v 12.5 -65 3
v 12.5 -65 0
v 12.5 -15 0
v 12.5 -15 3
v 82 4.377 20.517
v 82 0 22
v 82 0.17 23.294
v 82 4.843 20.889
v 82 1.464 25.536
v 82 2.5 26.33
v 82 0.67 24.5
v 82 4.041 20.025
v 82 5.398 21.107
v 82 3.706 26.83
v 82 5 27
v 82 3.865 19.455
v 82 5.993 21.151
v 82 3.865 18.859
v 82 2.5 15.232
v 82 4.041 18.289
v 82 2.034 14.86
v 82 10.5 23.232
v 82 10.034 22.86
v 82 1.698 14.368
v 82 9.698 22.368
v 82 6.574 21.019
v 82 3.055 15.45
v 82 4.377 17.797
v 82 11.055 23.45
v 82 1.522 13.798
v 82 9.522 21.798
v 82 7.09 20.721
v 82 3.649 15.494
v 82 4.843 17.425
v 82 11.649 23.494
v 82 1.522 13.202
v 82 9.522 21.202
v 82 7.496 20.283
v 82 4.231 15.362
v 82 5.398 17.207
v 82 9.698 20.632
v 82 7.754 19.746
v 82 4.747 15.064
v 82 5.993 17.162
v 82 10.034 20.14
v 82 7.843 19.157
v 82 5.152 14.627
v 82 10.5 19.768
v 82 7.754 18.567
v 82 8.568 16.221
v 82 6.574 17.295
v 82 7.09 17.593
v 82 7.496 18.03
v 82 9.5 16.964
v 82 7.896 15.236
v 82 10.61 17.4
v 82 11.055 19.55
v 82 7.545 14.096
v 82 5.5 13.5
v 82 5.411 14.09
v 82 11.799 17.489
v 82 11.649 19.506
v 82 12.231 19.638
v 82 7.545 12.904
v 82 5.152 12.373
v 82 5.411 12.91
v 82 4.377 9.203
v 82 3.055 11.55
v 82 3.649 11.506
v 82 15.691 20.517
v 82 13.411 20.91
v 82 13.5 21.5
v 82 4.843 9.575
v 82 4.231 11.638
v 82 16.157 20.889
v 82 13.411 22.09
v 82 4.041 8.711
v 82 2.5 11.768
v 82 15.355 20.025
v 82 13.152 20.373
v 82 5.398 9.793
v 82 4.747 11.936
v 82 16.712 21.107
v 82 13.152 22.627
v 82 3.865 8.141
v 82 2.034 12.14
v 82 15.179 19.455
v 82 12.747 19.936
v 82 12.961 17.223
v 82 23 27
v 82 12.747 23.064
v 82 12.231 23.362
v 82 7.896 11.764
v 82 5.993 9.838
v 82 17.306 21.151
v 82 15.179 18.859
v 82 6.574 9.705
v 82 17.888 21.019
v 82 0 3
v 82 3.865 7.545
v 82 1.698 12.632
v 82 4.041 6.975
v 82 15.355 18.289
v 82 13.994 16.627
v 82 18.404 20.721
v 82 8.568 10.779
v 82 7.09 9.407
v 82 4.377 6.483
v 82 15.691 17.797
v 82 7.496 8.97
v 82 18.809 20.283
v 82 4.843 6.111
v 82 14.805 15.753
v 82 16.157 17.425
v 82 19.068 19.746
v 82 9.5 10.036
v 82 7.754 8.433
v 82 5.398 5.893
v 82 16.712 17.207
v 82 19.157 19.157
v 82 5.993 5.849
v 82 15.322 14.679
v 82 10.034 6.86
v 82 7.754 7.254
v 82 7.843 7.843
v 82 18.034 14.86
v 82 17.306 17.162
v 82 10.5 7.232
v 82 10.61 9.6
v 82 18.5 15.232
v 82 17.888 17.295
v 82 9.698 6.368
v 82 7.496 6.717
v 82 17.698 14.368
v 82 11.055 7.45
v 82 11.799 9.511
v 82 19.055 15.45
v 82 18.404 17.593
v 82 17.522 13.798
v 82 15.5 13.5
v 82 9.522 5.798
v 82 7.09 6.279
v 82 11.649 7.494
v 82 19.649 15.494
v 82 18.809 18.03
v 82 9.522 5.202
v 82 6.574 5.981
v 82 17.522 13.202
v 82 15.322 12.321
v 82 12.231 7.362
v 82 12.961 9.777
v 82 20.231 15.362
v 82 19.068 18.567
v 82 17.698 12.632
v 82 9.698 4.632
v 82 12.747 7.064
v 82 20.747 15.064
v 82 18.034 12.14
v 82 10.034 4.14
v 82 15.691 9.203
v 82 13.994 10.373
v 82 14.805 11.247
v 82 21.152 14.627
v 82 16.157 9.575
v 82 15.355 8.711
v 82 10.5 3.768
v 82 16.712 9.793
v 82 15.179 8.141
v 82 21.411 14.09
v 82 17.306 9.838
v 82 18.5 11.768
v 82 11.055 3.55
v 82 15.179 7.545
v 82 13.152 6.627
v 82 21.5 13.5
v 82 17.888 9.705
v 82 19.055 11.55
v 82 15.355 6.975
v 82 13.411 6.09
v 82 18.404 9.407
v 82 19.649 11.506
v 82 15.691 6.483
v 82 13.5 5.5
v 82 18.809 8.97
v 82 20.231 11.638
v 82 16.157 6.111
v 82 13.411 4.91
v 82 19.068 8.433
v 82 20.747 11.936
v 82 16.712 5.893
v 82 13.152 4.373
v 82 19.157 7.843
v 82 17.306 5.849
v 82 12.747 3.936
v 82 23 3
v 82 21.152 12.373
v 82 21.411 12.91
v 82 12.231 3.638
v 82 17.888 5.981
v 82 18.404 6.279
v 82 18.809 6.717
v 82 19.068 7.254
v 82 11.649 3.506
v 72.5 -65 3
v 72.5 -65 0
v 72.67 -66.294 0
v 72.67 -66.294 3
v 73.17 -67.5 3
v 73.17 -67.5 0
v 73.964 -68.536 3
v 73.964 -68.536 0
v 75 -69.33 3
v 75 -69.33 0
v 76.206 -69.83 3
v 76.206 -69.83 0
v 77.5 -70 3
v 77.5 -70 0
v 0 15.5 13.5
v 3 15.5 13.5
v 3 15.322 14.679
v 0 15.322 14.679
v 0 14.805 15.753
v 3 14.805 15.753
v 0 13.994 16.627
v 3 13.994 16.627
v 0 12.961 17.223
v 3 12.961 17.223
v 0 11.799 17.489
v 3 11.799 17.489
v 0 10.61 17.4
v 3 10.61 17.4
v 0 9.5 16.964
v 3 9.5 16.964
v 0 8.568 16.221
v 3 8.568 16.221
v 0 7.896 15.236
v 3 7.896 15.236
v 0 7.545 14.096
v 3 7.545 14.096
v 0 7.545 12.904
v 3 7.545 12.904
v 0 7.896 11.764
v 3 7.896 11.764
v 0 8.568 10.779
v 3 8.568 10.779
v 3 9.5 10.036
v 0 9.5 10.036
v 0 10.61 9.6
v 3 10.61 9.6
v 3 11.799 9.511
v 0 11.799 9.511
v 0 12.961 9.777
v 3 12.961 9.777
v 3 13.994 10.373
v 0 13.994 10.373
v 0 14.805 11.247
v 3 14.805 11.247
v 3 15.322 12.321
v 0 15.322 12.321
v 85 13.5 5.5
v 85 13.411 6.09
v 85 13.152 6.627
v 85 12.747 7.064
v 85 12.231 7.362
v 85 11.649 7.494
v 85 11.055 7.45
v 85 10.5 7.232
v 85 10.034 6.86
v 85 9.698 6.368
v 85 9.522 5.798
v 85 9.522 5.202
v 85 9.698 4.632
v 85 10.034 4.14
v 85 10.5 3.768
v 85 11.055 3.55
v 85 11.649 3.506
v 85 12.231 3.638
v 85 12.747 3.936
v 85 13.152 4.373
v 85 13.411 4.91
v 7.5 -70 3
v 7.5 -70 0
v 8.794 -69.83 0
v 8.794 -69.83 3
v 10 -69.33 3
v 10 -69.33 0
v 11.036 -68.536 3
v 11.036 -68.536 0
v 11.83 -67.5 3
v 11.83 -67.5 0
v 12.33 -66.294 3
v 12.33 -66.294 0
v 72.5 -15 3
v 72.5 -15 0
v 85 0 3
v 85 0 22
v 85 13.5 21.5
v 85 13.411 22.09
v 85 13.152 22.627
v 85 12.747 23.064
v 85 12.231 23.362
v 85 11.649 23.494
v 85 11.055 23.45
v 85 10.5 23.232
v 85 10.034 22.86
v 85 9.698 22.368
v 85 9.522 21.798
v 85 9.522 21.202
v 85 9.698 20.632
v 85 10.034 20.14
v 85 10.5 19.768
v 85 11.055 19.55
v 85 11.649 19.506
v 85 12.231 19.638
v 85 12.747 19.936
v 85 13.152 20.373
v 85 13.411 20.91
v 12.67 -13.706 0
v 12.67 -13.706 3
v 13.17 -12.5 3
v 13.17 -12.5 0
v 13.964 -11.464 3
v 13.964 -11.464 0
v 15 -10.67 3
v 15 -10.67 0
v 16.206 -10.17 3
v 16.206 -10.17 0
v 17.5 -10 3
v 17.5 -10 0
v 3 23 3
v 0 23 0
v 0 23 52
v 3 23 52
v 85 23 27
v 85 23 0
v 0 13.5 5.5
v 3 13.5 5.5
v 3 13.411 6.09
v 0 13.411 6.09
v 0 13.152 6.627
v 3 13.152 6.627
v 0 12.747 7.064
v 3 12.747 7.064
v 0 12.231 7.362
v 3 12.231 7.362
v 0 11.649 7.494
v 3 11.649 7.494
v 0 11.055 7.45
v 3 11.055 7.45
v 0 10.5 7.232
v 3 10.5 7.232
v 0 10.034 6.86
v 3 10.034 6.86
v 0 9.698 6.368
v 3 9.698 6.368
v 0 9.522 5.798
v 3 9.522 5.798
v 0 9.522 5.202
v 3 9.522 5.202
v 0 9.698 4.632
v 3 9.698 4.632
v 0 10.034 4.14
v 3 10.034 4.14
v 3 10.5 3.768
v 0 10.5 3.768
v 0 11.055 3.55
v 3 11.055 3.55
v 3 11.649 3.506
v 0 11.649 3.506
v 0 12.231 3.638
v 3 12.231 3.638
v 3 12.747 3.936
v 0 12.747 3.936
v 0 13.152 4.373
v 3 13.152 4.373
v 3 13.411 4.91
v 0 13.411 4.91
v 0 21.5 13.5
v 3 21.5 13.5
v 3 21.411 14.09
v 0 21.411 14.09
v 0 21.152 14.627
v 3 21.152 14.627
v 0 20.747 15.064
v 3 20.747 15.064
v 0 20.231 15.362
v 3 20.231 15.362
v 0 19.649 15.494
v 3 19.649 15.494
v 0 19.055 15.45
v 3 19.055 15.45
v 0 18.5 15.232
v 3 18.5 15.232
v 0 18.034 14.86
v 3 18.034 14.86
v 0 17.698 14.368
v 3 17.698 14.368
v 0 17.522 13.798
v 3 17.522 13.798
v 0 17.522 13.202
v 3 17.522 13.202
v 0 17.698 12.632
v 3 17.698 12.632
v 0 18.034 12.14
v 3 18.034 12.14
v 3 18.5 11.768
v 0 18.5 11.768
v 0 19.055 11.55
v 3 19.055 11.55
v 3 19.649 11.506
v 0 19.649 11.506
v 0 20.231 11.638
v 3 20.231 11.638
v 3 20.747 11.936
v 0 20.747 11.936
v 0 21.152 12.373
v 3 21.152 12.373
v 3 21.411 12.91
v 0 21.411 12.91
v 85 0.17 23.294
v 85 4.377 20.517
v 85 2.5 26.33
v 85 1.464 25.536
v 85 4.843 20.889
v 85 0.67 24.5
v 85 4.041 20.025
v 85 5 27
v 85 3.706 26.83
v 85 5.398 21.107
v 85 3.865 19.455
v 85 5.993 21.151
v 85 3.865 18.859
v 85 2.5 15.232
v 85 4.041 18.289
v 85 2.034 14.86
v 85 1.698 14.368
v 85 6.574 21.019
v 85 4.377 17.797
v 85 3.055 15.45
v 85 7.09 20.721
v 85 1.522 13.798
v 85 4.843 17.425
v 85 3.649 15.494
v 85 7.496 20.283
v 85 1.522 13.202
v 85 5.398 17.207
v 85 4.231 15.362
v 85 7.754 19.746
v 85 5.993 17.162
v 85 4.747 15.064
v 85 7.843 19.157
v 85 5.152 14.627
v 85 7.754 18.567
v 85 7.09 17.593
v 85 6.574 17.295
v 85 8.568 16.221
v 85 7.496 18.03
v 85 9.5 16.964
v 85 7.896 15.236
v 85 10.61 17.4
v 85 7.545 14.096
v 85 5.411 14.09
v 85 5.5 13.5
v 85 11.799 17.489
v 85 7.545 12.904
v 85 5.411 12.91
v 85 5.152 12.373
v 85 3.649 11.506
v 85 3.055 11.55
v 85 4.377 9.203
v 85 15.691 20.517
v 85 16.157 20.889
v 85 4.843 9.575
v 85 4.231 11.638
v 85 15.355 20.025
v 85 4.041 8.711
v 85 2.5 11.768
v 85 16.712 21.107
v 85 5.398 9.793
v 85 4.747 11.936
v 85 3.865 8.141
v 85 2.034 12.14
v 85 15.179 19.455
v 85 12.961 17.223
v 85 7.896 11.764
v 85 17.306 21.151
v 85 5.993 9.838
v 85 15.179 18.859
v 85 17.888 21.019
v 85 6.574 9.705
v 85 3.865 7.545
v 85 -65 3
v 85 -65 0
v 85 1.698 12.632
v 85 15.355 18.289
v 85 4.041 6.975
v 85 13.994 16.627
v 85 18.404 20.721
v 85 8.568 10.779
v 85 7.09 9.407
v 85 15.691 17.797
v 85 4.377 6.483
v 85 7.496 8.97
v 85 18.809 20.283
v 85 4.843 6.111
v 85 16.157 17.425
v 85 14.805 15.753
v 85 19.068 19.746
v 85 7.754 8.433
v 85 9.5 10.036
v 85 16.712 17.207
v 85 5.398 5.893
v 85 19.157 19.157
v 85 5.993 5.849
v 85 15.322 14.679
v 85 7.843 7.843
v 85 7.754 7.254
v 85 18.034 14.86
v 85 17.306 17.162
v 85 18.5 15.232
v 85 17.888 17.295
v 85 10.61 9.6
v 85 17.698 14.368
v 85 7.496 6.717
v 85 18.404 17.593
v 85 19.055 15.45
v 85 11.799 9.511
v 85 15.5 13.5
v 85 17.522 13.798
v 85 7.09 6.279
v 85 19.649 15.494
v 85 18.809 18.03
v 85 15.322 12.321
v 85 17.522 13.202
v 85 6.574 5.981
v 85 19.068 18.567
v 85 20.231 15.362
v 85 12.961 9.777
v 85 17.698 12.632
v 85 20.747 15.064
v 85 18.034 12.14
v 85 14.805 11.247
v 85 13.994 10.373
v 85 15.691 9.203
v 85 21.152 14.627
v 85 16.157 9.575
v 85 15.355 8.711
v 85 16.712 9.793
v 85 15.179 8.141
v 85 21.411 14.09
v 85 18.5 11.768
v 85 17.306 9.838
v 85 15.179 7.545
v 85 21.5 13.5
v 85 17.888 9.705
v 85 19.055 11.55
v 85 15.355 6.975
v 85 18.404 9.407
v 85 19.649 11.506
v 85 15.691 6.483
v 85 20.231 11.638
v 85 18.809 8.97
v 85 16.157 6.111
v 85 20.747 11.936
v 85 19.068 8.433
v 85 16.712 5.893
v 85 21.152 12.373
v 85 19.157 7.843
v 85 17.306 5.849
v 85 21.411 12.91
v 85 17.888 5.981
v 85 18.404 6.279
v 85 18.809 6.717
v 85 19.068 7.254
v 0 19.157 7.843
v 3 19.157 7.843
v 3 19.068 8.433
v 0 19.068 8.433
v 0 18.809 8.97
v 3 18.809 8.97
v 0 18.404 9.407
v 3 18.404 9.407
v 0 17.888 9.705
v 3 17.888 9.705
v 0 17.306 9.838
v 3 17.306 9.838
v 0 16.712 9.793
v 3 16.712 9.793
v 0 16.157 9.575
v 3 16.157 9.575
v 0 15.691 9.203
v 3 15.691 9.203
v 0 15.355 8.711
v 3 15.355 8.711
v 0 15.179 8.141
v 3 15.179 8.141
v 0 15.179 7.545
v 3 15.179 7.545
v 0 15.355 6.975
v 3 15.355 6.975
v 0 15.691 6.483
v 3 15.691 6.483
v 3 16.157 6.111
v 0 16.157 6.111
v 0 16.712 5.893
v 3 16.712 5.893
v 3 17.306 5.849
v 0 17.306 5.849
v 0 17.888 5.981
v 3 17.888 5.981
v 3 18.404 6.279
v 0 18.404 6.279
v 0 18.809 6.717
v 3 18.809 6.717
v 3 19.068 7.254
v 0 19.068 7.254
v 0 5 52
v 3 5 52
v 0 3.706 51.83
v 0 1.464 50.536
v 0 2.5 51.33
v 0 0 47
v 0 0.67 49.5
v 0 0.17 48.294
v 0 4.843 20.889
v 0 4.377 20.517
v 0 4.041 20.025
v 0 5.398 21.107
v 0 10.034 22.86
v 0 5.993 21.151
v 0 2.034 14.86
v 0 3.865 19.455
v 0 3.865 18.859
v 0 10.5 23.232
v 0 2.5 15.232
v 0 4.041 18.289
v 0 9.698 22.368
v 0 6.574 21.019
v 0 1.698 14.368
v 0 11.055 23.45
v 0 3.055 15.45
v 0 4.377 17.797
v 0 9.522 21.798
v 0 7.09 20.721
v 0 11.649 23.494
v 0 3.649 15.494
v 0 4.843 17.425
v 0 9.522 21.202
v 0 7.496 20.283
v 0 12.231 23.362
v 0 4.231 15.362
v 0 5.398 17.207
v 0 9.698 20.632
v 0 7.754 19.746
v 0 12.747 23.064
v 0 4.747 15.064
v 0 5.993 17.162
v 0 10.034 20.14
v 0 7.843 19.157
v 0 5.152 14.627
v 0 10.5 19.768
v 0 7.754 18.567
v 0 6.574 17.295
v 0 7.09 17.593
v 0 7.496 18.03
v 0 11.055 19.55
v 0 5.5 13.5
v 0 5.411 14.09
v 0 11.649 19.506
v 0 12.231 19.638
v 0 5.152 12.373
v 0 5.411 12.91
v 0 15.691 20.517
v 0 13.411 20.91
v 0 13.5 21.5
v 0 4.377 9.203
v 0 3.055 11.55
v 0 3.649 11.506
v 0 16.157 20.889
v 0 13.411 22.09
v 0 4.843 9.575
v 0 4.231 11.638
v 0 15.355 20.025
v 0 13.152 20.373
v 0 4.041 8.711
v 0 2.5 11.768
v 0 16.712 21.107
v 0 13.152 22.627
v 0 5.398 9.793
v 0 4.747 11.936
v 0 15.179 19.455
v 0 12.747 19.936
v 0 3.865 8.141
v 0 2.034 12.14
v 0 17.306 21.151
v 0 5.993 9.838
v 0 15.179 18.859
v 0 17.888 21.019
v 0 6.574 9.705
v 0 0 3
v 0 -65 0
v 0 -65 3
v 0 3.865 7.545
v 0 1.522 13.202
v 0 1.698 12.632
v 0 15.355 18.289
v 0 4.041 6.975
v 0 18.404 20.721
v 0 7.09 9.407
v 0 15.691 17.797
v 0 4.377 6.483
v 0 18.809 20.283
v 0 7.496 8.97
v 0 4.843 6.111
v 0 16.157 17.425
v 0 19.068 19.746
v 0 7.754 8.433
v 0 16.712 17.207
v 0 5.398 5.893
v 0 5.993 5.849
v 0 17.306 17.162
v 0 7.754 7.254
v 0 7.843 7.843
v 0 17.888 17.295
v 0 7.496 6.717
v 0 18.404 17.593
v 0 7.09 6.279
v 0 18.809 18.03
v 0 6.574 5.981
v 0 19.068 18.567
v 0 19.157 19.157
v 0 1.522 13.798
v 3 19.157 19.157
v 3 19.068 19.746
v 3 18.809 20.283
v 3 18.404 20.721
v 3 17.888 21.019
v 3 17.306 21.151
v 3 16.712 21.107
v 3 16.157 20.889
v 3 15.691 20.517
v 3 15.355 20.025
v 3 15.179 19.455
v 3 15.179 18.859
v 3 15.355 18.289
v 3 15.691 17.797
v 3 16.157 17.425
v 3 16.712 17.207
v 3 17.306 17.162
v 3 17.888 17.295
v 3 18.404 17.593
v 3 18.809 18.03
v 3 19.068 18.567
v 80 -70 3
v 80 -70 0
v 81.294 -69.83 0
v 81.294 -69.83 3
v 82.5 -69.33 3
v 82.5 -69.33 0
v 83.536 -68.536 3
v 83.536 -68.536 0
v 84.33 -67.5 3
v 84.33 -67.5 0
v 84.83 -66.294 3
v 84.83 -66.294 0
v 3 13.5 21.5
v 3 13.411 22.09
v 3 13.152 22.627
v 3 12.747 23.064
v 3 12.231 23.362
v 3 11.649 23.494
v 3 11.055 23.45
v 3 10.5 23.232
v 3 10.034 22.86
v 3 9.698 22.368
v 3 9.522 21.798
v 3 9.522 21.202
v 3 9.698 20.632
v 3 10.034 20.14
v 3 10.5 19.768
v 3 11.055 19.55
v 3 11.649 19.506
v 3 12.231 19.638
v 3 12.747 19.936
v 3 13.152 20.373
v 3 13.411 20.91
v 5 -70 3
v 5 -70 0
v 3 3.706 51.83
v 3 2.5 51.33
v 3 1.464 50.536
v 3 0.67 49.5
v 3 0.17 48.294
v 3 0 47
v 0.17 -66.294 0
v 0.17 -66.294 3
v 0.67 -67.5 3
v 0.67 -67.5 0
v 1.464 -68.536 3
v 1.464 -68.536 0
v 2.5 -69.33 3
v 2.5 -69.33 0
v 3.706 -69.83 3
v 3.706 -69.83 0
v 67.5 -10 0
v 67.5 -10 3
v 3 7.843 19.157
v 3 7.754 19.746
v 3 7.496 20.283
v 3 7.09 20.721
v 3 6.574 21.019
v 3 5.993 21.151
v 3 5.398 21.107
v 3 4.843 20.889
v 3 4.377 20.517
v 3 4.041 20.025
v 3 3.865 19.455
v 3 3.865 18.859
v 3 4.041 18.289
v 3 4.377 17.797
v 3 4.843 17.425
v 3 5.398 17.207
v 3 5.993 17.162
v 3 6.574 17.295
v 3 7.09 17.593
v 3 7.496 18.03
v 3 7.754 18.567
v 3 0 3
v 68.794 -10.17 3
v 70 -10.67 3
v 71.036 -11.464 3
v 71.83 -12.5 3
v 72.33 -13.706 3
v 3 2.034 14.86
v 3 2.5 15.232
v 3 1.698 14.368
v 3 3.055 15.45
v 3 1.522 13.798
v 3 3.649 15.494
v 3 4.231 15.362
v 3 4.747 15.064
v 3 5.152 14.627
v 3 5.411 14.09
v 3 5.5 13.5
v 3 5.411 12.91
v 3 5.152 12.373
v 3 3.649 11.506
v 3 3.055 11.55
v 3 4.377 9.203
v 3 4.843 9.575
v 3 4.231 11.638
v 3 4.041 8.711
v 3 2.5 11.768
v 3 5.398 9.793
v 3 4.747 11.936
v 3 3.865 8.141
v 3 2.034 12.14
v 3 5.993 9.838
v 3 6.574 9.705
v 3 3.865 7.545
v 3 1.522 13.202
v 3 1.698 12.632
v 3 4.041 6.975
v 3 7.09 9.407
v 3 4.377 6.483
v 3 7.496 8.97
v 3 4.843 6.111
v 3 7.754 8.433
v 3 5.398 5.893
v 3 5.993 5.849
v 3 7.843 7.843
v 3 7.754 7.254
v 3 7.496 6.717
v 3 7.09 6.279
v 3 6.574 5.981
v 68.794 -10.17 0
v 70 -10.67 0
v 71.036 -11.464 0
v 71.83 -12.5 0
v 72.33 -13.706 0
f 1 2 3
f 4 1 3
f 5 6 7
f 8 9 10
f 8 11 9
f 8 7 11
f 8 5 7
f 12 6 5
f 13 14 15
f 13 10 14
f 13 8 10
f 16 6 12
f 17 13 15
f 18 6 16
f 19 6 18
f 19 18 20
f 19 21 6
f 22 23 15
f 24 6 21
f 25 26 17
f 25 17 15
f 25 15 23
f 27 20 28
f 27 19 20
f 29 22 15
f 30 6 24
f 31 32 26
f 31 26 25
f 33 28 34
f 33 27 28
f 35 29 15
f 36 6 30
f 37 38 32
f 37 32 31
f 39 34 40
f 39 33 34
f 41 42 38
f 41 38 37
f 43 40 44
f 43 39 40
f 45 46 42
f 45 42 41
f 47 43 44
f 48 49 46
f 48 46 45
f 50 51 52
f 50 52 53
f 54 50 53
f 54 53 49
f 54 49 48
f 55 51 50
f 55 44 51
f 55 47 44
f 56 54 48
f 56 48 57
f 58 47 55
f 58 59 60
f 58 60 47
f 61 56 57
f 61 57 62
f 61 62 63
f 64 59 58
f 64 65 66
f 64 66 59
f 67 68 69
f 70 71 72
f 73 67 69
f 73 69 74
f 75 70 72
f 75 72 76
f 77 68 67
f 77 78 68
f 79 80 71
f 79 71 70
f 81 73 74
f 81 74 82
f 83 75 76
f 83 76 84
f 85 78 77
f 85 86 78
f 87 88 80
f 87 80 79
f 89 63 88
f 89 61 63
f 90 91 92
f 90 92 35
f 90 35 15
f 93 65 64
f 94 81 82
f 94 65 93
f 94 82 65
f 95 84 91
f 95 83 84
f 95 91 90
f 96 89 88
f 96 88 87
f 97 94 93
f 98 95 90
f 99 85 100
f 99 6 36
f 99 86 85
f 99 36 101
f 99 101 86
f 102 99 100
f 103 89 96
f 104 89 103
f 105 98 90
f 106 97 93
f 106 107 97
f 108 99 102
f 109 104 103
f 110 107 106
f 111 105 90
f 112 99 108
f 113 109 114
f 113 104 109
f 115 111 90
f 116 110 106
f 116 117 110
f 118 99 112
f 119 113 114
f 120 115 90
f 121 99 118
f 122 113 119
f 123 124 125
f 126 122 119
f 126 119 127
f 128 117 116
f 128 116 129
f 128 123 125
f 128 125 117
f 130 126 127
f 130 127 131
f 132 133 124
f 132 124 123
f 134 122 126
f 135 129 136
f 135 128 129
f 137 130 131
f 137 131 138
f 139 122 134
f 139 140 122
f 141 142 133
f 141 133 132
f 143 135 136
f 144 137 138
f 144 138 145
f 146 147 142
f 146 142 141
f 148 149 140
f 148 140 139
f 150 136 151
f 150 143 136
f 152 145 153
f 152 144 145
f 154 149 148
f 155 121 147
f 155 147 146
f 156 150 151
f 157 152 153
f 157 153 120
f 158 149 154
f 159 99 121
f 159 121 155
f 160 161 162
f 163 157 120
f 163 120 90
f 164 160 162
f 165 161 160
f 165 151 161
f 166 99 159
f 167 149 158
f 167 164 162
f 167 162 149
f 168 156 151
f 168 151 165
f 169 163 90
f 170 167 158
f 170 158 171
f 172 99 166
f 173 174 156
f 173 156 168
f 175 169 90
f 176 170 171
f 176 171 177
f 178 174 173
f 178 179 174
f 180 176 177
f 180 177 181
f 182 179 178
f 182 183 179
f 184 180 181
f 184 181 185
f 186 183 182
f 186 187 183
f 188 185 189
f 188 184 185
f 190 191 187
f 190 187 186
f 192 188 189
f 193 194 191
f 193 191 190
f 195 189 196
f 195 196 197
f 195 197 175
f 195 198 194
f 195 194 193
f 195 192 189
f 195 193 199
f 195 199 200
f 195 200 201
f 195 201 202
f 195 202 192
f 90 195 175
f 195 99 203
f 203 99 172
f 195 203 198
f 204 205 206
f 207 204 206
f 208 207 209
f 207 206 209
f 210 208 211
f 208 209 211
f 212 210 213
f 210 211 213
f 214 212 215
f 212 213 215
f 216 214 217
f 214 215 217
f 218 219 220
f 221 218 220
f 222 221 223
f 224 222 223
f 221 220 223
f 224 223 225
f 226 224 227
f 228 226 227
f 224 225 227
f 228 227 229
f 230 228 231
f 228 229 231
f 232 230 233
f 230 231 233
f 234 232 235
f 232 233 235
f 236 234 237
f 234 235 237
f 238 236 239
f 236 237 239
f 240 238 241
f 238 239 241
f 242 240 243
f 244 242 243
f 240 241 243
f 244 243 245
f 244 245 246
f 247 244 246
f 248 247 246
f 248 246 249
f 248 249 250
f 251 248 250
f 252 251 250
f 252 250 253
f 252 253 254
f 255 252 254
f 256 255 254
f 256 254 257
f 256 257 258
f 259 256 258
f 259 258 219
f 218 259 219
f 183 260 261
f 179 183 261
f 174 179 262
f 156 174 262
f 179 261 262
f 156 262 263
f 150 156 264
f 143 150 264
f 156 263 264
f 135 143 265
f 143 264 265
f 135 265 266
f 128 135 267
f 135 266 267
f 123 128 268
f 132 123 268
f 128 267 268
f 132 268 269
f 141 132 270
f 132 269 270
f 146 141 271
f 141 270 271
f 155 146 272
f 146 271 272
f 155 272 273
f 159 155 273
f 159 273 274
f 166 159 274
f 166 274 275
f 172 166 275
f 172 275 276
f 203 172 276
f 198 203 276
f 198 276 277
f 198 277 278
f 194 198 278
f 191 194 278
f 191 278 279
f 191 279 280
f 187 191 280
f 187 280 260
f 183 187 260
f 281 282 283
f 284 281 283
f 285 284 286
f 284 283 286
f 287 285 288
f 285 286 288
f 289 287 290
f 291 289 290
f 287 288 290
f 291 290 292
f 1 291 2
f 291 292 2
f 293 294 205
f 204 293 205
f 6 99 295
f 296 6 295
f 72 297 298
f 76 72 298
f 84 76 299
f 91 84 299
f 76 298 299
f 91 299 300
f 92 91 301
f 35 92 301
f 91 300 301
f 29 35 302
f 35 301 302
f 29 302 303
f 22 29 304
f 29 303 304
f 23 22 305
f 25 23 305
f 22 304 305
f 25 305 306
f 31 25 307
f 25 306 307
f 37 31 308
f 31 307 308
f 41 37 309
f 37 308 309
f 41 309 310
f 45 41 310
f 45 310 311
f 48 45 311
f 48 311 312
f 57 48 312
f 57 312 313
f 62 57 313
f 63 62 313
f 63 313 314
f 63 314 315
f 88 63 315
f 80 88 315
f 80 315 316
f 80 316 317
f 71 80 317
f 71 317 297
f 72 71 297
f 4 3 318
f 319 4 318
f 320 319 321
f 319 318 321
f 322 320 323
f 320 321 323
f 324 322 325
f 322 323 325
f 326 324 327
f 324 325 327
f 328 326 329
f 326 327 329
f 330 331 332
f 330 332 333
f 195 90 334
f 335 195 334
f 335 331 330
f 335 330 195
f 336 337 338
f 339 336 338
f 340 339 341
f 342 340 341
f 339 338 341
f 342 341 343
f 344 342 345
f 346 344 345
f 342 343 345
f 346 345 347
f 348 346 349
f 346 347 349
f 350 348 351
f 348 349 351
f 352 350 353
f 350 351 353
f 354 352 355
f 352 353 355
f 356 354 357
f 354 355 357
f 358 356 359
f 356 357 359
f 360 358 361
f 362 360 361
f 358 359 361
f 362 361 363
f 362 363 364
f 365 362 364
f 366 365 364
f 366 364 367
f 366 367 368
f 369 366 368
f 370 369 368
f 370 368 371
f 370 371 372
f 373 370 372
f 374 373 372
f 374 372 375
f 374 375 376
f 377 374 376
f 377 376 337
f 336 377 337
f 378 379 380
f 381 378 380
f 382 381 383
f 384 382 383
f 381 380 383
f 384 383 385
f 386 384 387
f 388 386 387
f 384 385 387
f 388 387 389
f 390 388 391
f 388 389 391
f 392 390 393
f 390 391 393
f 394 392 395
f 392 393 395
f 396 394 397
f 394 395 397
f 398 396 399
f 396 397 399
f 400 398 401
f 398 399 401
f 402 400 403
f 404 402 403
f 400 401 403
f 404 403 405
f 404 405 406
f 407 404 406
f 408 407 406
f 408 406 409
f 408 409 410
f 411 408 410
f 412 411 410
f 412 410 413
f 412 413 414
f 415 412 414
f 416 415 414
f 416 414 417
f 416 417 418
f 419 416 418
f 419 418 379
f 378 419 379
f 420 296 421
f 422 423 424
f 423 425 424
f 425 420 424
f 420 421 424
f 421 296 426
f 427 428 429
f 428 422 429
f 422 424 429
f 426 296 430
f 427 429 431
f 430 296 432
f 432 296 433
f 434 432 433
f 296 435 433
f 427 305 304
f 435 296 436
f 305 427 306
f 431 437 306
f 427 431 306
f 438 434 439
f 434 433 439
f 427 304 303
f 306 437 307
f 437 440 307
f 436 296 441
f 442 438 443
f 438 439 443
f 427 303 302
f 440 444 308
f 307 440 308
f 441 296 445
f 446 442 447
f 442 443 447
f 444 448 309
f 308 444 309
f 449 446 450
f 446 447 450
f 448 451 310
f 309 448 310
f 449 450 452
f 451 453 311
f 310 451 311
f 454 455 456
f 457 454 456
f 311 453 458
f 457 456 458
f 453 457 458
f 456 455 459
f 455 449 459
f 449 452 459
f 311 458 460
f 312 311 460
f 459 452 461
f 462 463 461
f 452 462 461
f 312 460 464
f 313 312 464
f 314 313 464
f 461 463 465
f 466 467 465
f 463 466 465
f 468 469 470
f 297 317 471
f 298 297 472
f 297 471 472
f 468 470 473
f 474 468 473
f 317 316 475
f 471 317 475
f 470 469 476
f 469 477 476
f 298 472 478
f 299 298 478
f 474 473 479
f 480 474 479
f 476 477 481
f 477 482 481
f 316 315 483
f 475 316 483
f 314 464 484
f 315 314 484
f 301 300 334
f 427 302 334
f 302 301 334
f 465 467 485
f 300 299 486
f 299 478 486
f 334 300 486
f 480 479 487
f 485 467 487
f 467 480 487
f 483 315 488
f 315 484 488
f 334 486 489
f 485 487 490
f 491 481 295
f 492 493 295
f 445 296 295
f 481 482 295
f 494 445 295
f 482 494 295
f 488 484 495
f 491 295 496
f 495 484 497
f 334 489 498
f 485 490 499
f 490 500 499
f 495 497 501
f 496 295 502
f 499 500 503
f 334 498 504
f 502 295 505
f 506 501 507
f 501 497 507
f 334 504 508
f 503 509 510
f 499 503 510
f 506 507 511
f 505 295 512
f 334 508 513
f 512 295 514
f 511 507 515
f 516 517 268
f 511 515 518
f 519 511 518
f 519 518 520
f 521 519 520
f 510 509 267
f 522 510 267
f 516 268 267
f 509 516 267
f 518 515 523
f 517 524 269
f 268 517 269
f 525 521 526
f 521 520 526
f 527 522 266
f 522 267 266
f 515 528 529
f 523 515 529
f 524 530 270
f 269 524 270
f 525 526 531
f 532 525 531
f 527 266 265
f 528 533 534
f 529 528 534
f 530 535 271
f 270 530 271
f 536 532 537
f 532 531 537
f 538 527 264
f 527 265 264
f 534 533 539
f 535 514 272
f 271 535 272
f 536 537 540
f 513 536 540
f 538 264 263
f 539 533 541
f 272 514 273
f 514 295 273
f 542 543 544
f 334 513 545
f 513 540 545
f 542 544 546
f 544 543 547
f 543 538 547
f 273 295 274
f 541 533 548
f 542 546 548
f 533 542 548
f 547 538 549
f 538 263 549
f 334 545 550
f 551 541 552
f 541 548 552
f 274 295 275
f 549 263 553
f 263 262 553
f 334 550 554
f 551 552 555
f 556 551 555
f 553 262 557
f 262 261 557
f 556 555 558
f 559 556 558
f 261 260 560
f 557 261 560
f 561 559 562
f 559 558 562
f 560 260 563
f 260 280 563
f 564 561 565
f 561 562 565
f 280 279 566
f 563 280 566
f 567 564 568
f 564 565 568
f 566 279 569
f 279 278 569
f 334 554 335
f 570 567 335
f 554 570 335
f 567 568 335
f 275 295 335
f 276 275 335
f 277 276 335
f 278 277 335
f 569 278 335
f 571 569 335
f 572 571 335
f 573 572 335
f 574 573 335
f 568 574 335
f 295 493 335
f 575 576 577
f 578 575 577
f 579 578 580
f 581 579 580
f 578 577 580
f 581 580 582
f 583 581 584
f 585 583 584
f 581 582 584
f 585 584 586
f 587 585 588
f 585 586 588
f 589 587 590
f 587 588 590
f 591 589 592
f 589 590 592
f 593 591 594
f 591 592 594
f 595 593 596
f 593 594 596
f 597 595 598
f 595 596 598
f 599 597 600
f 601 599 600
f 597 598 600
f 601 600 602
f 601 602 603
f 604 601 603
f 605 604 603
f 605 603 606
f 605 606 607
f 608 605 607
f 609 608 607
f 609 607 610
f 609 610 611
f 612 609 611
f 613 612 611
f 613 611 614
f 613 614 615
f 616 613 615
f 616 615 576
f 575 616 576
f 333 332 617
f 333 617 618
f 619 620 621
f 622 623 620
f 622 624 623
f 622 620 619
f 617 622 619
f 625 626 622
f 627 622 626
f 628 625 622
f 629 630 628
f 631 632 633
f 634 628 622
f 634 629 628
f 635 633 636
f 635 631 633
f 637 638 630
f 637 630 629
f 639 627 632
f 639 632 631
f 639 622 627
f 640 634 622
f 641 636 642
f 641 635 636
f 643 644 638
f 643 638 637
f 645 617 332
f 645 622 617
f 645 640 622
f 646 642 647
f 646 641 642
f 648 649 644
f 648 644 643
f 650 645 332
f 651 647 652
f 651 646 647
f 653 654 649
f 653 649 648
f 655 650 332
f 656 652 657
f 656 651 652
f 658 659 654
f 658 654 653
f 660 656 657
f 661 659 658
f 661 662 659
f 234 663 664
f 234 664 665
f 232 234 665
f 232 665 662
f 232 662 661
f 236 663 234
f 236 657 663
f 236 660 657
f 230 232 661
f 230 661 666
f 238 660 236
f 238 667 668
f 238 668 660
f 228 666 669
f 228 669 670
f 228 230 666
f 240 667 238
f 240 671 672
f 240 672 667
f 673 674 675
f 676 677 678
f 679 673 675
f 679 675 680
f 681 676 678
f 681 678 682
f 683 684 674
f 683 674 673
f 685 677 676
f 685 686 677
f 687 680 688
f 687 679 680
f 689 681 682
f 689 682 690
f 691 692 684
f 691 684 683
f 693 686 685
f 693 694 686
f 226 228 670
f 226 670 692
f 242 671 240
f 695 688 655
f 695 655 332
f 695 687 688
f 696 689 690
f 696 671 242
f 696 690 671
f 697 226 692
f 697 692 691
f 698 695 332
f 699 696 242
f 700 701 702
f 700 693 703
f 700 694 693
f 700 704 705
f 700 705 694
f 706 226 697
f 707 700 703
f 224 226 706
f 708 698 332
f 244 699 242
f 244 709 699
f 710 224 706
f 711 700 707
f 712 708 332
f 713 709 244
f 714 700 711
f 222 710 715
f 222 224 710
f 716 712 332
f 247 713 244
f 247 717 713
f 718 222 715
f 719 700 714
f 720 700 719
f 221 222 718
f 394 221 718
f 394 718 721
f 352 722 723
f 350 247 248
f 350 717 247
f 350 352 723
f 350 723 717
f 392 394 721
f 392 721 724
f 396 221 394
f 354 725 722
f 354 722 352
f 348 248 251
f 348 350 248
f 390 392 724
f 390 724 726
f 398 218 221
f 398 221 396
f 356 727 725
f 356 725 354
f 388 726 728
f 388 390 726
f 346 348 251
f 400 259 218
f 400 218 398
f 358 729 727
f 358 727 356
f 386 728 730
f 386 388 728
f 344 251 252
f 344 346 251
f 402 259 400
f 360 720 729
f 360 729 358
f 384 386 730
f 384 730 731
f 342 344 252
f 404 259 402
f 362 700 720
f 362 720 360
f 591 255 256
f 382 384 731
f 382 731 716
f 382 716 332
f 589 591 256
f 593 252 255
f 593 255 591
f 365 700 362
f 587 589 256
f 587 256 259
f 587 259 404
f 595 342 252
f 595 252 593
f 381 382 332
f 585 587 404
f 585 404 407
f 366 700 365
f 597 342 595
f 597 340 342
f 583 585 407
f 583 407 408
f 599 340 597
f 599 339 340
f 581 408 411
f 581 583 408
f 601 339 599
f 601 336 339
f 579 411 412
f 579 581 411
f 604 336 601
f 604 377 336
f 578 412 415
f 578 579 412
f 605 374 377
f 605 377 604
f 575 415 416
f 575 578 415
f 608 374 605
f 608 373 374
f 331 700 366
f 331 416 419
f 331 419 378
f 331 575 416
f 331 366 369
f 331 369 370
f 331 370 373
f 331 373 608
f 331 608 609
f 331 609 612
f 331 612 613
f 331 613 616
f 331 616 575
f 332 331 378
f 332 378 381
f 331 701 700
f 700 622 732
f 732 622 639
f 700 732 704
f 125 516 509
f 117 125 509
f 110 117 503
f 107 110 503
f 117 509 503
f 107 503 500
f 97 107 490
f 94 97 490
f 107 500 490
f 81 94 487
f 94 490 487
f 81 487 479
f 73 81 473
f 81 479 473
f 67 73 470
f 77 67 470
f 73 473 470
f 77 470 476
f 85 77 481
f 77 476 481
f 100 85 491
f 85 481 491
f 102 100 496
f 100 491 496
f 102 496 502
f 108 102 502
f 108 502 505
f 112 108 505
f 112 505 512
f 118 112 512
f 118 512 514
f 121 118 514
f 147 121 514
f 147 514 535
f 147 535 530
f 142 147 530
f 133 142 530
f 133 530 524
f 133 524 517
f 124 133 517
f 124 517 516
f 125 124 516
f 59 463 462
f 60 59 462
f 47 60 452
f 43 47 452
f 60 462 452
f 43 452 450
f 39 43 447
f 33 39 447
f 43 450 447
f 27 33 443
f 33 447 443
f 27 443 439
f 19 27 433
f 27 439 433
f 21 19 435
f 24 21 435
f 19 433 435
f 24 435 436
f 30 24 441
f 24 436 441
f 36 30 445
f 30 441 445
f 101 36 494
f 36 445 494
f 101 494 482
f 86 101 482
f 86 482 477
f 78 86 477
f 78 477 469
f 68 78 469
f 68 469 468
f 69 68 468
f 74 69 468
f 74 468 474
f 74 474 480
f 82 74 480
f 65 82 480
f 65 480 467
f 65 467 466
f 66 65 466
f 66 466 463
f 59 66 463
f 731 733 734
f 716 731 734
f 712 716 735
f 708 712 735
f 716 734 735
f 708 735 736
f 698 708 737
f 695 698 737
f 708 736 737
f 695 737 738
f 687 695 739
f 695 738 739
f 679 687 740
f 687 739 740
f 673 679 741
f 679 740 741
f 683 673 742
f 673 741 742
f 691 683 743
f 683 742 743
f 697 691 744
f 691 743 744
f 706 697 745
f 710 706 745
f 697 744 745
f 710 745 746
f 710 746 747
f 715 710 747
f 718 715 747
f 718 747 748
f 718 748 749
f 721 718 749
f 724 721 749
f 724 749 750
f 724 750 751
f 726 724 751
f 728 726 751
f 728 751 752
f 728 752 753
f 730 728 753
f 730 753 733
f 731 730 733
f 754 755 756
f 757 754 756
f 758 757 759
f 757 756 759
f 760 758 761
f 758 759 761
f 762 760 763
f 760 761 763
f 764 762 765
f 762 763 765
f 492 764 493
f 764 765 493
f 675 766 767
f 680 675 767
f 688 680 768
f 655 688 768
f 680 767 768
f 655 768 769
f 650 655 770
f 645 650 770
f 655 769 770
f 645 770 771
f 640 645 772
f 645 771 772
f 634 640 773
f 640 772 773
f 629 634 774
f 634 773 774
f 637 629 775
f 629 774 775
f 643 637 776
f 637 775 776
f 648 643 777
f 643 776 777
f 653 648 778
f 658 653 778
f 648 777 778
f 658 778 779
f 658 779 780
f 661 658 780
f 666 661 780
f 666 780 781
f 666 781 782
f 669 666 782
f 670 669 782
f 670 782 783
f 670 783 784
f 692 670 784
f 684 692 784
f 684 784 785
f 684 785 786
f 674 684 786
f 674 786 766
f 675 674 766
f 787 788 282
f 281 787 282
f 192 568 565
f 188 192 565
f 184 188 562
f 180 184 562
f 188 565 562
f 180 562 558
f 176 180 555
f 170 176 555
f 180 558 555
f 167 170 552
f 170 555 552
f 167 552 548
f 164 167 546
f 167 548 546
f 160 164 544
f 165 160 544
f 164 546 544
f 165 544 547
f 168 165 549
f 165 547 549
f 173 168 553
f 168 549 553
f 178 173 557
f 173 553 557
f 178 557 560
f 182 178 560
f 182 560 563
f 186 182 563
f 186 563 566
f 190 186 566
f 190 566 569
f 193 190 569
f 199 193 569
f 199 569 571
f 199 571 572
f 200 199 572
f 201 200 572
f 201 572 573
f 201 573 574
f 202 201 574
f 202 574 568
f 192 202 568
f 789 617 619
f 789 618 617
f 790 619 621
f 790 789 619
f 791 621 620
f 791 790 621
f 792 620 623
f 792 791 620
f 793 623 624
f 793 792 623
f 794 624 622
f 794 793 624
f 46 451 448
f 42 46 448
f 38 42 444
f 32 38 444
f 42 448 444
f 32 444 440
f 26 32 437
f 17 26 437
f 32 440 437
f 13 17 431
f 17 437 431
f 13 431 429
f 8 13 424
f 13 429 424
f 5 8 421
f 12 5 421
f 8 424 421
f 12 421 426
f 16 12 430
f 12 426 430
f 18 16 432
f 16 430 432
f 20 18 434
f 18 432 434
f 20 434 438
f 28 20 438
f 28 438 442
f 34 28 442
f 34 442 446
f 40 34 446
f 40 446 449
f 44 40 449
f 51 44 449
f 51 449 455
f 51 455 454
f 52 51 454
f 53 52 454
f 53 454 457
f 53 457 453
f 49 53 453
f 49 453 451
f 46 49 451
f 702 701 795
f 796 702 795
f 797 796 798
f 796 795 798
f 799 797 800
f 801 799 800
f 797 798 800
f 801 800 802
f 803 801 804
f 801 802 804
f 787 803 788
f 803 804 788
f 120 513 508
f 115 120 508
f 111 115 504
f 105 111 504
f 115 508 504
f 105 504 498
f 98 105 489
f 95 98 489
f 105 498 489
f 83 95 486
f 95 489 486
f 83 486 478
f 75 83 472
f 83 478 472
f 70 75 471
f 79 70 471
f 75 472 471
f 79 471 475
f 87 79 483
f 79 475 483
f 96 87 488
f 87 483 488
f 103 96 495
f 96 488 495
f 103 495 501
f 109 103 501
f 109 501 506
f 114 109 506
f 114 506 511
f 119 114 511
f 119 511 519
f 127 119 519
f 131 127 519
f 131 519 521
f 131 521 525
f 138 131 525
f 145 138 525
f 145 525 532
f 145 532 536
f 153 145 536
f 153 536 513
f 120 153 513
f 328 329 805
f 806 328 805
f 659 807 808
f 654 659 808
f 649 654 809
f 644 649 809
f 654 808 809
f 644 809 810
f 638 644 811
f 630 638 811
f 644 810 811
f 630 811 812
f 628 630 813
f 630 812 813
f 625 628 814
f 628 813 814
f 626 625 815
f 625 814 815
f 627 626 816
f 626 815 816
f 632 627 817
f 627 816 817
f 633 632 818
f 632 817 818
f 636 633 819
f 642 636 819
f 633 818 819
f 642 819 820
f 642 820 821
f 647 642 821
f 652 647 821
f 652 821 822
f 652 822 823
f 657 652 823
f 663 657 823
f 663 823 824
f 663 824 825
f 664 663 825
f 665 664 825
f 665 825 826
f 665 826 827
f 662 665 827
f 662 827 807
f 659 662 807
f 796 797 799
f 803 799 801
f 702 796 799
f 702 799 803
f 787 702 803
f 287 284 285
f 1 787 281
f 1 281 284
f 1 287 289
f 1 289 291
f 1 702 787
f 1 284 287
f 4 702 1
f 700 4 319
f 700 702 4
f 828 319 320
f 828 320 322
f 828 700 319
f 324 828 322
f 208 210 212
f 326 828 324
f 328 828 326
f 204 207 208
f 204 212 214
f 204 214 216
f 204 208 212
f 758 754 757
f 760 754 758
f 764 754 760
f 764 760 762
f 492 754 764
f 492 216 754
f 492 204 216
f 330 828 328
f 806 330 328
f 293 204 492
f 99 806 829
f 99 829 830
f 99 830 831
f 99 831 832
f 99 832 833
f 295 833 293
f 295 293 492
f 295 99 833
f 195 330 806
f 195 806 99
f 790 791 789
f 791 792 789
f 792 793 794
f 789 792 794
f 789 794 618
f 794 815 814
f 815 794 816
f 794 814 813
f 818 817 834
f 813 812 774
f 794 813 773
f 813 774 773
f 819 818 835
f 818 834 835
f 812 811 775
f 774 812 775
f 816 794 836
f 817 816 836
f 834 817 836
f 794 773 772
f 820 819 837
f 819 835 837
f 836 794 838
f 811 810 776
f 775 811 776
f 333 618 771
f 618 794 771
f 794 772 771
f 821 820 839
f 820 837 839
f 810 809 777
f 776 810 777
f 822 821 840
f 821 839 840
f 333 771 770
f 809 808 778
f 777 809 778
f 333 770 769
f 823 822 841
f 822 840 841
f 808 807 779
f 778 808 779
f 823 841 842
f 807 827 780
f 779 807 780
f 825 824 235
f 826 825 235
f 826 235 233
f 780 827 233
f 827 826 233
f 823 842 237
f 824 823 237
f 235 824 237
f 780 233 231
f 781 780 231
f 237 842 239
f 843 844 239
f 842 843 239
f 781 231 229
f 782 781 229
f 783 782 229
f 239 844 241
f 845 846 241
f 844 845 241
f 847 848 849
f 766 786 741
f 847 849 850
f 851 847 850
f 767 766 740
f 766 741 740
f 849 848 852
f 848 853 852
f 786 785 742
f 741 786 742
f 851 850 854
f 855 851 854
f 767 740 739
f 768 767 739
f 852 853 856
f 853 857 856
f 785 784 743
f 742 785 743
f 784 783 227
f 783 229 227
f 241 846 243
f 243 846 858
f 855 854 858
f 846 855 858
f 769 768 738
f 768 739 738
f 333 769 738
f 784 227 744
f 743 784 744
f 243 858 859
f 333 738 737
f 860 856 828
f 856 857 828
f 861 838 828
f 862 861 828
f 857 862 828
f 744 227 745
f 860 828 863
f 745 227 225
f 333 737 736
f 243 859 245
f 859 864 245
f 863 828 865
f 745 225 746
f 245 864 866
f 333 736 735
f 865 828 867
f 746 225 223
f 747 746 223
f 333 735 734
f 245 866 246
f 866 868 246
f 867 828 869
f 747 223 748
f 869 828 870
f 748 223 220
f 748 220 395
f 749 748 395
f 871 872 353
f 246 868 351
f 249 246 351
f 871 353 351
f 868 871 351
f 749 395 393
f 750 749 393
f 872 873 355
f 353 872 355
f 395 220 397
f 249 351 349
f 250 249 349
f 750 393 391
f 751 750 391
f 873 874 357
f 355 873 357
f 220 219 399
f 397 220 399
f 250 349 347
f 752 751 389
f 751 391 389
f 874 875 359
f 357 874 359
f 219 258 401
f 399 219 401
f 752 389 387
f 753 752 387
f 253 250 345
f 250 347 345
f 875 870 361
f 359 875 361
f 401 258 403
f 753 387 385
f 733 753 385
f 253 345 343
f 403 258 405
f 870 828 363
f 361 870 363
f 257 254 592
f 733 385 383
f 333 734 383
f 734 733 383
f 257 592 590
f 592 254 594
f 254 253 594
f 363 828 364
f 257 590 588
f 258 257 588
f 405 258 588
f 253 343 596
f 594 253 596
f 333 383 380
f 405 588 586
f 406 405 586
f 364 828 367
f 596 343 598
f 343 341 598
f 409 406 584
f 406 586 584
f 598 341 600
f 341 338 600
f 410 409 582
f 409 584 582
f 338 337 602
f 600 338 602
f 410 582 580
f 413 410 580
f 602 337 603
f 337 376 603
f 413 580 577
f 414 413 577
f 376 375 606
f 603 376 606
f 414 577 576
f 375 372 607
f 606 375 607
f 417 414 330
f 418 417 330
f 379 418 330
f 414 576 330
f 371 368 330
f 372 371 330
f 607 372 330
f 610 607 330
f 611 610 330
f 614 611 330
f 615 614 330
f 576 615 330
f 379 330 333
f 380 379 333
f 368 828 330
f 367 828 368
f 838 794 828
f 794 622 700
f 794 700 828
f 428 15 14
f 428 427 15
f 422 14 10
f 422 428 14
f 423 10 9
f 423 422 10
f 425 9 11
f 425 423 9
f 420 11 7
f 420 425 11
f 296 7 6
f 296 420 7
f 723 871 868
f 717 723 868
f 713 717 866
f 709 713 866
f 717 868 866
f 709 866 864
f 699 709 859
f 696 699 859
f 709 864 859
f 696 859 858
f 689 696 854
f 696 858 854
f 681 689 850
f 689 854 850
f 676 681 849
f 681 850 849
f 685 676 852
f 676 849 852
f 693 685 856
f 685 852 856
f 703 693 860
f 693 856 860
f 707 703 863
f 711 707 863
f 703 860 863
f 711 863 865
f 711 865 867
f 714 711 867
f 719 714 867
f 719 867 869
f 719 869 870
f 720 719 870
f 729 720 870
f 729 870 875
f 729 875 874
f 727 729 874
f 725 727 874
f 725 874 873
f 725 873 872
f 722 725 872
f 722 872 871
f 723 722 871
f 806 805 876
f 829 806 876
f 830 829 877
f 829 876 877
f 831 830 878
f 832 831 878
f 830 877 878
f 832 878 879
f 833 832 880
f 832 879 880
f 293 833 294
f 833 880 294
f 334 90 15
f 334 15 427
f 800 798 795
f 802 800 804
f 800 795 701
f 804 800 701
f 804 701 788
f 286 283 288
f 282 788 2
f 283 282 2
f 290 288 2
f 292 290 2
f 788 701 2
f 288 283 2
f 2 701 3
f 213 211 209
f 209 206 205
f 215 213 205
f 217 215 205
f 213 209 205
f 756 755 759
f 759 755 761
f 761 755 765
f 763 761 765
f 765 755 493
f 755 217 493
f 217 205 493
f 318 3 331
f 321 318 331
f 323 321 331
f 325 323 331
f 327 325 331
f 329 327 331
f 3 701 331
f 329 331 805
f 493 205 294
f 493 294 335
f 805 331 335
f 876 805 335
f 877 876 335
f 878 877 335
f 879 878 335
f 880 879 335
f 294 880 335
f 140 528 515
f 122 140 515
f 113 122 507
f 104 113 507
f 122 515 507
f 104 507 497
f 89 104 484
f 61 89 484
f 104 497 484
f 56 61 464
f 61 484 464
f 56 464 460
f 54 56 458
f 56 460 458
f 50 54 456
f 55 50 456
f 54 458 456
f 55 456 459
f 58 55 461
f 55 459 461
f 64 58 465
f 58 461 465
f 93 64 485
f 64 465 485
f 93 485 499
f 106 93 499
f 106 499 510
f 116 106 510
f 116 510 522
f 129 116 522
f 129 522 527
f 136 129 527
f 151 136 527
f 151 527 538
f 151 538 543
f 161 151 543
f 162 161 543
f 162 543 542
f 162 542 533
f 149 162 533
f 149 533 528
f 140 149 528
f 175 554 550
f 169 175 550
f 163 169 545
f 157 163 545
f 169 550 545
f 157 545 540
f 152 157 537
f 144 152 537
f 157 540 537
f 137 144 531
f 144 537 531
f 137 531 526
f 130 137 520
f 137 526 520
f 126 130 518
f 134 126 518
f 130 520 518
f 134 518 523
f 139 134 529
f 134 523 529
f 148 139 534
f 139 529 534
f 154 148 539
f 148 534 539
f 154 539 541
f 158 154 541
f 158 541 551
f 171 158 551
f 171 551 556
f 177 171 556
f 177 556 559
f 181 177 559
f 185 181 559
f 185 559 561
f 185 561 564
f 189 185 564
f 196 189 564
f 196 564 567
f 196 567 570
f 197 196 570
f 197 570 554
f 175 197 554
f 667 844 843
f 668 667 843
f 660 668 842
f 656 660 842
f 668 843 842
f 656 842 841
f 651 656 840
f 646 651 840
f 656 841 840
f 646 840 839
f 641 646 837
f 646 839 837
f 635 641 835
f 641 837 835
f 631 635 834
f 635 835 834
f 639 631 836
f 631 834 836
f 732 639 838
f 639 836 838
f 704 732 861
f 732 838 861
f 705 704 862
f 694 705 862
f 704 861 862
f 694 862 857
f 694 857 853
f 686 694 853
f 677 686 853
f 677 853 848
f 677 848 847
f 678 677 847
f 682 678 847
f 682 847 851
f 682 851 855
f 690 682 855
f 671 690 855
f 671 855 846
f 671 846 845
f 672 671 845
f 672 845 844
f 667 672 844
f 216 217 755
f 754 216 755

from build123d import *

# Parameters (mm, degrees)
F0_W     = 85
F0_H     = 23
F1_DEPTH = 3
F2_W     = 3
F2_H     = 23
F3_DEPTH = 24
F4_W     = 3
F4_H     = 23
F5_DEPTH = 25
F6_R     = 4
F6_R_2   = 2
F7_DEPTH = 100
F8_R     = 5


with BuildPart() as f1:
    # F0 (on Top) → F1 (new body)
    with BuildSketch(Plane.XY):
        with Locations((42.5, 11.5)):
            Rectangle(F0_W, F0_H)
        with BuildLine():
            Line((85, 0), (0, 0))
            Line((0, 0), (0, -10))
            Line((0, -10), (0, -65))
            ThreePointArc((0, -65), (1.464466, -68.535534), (5, -70))
            Line((5, -70), (7.5, -70))
            ThreePointArc((7.5, -70), (11.035534, -68.535534), (12.5, -65))
            Line((12.5, -65), (12.5, -15))
            ThreePointArc((12.5, -15), (13.964466, -11.464466), (17.5, -10))
            Line((17.5, -10), (67.5, -10))
            ThreePointArc((67.5, -10), (71.035534, -11.464466), (72.5, -15))
            Line((72.5, -15), (72.5, -65))
            ThreePointArc((72.5, -65), (73.964466, -68.535534), (77.5, -70))
            Line((77.5, -70), (80, -70))
            ThreePointArc((80, -70), (83.535534, -68.535534), (85, -65))
            Line((85, -65), (85, -10))
            Line((85, -10), (85, 0))
        make_face()
    extrude(amount=F1_DEPTH)

    # F2 (on face) → F3 (join)
    with BuildSketch(Plane.XY.offset(3)):
        with Locations((1.5, 11.5)):
            Rectangle(F2_W, F2_H)
        with Locations((83.5, 11.5)):
            Rectangle(F2_W, F2_H)
    extrude(amount=F3_DEPTH)

    # F4 (on face) → F5 (join)
    with BuildSketch(Plane.XY.offset(27)):
        with Locations((1.5, 11.5)):
            Rectangle(F4_W, F4_H)
    extrude(amount=F5_DEPTH)

    # F6 (on face) → F7 (cut)
    with BuildSketch(Plane.YZ.offset(85)):
        with Locations((11.5, 13.5)):
            Circle(F6_R)
        with Locations((19.5, 13.5)):
            Circle(F6_R_2)
        with Locations((17.156854, 19.156854)):
            Circle(F6_R_2)
        with Locations((11.5, 21.5)):
            Circle(F6_R_2)
        with Locations((5.843146, 19.156854)):
            Circle(F6_R_2)
        with Locations((3.5, 13.5)):
            Circle(F6_R_2)
        with Locations((5.843146, 7.843146)):
            Circle(F6_R_2)
        with Locations((11.5, 5.5)):
            Circle(F6_R_2)
        with Locations((17.156854, 7.843146)):
            Circle(F6_R_2)
    extrude(amount=-F7_DEPTH, mode=Mode.SUBTRACT)

    # F8
    f8_edges = [f1.edges().sort_by_distance(p)[0] for p in [
        (1.5, 0, 52),
        (83.5, 0, 27),
    ]]
    fillet(f8_edges, radius=F8_R)


solid = f1.part
